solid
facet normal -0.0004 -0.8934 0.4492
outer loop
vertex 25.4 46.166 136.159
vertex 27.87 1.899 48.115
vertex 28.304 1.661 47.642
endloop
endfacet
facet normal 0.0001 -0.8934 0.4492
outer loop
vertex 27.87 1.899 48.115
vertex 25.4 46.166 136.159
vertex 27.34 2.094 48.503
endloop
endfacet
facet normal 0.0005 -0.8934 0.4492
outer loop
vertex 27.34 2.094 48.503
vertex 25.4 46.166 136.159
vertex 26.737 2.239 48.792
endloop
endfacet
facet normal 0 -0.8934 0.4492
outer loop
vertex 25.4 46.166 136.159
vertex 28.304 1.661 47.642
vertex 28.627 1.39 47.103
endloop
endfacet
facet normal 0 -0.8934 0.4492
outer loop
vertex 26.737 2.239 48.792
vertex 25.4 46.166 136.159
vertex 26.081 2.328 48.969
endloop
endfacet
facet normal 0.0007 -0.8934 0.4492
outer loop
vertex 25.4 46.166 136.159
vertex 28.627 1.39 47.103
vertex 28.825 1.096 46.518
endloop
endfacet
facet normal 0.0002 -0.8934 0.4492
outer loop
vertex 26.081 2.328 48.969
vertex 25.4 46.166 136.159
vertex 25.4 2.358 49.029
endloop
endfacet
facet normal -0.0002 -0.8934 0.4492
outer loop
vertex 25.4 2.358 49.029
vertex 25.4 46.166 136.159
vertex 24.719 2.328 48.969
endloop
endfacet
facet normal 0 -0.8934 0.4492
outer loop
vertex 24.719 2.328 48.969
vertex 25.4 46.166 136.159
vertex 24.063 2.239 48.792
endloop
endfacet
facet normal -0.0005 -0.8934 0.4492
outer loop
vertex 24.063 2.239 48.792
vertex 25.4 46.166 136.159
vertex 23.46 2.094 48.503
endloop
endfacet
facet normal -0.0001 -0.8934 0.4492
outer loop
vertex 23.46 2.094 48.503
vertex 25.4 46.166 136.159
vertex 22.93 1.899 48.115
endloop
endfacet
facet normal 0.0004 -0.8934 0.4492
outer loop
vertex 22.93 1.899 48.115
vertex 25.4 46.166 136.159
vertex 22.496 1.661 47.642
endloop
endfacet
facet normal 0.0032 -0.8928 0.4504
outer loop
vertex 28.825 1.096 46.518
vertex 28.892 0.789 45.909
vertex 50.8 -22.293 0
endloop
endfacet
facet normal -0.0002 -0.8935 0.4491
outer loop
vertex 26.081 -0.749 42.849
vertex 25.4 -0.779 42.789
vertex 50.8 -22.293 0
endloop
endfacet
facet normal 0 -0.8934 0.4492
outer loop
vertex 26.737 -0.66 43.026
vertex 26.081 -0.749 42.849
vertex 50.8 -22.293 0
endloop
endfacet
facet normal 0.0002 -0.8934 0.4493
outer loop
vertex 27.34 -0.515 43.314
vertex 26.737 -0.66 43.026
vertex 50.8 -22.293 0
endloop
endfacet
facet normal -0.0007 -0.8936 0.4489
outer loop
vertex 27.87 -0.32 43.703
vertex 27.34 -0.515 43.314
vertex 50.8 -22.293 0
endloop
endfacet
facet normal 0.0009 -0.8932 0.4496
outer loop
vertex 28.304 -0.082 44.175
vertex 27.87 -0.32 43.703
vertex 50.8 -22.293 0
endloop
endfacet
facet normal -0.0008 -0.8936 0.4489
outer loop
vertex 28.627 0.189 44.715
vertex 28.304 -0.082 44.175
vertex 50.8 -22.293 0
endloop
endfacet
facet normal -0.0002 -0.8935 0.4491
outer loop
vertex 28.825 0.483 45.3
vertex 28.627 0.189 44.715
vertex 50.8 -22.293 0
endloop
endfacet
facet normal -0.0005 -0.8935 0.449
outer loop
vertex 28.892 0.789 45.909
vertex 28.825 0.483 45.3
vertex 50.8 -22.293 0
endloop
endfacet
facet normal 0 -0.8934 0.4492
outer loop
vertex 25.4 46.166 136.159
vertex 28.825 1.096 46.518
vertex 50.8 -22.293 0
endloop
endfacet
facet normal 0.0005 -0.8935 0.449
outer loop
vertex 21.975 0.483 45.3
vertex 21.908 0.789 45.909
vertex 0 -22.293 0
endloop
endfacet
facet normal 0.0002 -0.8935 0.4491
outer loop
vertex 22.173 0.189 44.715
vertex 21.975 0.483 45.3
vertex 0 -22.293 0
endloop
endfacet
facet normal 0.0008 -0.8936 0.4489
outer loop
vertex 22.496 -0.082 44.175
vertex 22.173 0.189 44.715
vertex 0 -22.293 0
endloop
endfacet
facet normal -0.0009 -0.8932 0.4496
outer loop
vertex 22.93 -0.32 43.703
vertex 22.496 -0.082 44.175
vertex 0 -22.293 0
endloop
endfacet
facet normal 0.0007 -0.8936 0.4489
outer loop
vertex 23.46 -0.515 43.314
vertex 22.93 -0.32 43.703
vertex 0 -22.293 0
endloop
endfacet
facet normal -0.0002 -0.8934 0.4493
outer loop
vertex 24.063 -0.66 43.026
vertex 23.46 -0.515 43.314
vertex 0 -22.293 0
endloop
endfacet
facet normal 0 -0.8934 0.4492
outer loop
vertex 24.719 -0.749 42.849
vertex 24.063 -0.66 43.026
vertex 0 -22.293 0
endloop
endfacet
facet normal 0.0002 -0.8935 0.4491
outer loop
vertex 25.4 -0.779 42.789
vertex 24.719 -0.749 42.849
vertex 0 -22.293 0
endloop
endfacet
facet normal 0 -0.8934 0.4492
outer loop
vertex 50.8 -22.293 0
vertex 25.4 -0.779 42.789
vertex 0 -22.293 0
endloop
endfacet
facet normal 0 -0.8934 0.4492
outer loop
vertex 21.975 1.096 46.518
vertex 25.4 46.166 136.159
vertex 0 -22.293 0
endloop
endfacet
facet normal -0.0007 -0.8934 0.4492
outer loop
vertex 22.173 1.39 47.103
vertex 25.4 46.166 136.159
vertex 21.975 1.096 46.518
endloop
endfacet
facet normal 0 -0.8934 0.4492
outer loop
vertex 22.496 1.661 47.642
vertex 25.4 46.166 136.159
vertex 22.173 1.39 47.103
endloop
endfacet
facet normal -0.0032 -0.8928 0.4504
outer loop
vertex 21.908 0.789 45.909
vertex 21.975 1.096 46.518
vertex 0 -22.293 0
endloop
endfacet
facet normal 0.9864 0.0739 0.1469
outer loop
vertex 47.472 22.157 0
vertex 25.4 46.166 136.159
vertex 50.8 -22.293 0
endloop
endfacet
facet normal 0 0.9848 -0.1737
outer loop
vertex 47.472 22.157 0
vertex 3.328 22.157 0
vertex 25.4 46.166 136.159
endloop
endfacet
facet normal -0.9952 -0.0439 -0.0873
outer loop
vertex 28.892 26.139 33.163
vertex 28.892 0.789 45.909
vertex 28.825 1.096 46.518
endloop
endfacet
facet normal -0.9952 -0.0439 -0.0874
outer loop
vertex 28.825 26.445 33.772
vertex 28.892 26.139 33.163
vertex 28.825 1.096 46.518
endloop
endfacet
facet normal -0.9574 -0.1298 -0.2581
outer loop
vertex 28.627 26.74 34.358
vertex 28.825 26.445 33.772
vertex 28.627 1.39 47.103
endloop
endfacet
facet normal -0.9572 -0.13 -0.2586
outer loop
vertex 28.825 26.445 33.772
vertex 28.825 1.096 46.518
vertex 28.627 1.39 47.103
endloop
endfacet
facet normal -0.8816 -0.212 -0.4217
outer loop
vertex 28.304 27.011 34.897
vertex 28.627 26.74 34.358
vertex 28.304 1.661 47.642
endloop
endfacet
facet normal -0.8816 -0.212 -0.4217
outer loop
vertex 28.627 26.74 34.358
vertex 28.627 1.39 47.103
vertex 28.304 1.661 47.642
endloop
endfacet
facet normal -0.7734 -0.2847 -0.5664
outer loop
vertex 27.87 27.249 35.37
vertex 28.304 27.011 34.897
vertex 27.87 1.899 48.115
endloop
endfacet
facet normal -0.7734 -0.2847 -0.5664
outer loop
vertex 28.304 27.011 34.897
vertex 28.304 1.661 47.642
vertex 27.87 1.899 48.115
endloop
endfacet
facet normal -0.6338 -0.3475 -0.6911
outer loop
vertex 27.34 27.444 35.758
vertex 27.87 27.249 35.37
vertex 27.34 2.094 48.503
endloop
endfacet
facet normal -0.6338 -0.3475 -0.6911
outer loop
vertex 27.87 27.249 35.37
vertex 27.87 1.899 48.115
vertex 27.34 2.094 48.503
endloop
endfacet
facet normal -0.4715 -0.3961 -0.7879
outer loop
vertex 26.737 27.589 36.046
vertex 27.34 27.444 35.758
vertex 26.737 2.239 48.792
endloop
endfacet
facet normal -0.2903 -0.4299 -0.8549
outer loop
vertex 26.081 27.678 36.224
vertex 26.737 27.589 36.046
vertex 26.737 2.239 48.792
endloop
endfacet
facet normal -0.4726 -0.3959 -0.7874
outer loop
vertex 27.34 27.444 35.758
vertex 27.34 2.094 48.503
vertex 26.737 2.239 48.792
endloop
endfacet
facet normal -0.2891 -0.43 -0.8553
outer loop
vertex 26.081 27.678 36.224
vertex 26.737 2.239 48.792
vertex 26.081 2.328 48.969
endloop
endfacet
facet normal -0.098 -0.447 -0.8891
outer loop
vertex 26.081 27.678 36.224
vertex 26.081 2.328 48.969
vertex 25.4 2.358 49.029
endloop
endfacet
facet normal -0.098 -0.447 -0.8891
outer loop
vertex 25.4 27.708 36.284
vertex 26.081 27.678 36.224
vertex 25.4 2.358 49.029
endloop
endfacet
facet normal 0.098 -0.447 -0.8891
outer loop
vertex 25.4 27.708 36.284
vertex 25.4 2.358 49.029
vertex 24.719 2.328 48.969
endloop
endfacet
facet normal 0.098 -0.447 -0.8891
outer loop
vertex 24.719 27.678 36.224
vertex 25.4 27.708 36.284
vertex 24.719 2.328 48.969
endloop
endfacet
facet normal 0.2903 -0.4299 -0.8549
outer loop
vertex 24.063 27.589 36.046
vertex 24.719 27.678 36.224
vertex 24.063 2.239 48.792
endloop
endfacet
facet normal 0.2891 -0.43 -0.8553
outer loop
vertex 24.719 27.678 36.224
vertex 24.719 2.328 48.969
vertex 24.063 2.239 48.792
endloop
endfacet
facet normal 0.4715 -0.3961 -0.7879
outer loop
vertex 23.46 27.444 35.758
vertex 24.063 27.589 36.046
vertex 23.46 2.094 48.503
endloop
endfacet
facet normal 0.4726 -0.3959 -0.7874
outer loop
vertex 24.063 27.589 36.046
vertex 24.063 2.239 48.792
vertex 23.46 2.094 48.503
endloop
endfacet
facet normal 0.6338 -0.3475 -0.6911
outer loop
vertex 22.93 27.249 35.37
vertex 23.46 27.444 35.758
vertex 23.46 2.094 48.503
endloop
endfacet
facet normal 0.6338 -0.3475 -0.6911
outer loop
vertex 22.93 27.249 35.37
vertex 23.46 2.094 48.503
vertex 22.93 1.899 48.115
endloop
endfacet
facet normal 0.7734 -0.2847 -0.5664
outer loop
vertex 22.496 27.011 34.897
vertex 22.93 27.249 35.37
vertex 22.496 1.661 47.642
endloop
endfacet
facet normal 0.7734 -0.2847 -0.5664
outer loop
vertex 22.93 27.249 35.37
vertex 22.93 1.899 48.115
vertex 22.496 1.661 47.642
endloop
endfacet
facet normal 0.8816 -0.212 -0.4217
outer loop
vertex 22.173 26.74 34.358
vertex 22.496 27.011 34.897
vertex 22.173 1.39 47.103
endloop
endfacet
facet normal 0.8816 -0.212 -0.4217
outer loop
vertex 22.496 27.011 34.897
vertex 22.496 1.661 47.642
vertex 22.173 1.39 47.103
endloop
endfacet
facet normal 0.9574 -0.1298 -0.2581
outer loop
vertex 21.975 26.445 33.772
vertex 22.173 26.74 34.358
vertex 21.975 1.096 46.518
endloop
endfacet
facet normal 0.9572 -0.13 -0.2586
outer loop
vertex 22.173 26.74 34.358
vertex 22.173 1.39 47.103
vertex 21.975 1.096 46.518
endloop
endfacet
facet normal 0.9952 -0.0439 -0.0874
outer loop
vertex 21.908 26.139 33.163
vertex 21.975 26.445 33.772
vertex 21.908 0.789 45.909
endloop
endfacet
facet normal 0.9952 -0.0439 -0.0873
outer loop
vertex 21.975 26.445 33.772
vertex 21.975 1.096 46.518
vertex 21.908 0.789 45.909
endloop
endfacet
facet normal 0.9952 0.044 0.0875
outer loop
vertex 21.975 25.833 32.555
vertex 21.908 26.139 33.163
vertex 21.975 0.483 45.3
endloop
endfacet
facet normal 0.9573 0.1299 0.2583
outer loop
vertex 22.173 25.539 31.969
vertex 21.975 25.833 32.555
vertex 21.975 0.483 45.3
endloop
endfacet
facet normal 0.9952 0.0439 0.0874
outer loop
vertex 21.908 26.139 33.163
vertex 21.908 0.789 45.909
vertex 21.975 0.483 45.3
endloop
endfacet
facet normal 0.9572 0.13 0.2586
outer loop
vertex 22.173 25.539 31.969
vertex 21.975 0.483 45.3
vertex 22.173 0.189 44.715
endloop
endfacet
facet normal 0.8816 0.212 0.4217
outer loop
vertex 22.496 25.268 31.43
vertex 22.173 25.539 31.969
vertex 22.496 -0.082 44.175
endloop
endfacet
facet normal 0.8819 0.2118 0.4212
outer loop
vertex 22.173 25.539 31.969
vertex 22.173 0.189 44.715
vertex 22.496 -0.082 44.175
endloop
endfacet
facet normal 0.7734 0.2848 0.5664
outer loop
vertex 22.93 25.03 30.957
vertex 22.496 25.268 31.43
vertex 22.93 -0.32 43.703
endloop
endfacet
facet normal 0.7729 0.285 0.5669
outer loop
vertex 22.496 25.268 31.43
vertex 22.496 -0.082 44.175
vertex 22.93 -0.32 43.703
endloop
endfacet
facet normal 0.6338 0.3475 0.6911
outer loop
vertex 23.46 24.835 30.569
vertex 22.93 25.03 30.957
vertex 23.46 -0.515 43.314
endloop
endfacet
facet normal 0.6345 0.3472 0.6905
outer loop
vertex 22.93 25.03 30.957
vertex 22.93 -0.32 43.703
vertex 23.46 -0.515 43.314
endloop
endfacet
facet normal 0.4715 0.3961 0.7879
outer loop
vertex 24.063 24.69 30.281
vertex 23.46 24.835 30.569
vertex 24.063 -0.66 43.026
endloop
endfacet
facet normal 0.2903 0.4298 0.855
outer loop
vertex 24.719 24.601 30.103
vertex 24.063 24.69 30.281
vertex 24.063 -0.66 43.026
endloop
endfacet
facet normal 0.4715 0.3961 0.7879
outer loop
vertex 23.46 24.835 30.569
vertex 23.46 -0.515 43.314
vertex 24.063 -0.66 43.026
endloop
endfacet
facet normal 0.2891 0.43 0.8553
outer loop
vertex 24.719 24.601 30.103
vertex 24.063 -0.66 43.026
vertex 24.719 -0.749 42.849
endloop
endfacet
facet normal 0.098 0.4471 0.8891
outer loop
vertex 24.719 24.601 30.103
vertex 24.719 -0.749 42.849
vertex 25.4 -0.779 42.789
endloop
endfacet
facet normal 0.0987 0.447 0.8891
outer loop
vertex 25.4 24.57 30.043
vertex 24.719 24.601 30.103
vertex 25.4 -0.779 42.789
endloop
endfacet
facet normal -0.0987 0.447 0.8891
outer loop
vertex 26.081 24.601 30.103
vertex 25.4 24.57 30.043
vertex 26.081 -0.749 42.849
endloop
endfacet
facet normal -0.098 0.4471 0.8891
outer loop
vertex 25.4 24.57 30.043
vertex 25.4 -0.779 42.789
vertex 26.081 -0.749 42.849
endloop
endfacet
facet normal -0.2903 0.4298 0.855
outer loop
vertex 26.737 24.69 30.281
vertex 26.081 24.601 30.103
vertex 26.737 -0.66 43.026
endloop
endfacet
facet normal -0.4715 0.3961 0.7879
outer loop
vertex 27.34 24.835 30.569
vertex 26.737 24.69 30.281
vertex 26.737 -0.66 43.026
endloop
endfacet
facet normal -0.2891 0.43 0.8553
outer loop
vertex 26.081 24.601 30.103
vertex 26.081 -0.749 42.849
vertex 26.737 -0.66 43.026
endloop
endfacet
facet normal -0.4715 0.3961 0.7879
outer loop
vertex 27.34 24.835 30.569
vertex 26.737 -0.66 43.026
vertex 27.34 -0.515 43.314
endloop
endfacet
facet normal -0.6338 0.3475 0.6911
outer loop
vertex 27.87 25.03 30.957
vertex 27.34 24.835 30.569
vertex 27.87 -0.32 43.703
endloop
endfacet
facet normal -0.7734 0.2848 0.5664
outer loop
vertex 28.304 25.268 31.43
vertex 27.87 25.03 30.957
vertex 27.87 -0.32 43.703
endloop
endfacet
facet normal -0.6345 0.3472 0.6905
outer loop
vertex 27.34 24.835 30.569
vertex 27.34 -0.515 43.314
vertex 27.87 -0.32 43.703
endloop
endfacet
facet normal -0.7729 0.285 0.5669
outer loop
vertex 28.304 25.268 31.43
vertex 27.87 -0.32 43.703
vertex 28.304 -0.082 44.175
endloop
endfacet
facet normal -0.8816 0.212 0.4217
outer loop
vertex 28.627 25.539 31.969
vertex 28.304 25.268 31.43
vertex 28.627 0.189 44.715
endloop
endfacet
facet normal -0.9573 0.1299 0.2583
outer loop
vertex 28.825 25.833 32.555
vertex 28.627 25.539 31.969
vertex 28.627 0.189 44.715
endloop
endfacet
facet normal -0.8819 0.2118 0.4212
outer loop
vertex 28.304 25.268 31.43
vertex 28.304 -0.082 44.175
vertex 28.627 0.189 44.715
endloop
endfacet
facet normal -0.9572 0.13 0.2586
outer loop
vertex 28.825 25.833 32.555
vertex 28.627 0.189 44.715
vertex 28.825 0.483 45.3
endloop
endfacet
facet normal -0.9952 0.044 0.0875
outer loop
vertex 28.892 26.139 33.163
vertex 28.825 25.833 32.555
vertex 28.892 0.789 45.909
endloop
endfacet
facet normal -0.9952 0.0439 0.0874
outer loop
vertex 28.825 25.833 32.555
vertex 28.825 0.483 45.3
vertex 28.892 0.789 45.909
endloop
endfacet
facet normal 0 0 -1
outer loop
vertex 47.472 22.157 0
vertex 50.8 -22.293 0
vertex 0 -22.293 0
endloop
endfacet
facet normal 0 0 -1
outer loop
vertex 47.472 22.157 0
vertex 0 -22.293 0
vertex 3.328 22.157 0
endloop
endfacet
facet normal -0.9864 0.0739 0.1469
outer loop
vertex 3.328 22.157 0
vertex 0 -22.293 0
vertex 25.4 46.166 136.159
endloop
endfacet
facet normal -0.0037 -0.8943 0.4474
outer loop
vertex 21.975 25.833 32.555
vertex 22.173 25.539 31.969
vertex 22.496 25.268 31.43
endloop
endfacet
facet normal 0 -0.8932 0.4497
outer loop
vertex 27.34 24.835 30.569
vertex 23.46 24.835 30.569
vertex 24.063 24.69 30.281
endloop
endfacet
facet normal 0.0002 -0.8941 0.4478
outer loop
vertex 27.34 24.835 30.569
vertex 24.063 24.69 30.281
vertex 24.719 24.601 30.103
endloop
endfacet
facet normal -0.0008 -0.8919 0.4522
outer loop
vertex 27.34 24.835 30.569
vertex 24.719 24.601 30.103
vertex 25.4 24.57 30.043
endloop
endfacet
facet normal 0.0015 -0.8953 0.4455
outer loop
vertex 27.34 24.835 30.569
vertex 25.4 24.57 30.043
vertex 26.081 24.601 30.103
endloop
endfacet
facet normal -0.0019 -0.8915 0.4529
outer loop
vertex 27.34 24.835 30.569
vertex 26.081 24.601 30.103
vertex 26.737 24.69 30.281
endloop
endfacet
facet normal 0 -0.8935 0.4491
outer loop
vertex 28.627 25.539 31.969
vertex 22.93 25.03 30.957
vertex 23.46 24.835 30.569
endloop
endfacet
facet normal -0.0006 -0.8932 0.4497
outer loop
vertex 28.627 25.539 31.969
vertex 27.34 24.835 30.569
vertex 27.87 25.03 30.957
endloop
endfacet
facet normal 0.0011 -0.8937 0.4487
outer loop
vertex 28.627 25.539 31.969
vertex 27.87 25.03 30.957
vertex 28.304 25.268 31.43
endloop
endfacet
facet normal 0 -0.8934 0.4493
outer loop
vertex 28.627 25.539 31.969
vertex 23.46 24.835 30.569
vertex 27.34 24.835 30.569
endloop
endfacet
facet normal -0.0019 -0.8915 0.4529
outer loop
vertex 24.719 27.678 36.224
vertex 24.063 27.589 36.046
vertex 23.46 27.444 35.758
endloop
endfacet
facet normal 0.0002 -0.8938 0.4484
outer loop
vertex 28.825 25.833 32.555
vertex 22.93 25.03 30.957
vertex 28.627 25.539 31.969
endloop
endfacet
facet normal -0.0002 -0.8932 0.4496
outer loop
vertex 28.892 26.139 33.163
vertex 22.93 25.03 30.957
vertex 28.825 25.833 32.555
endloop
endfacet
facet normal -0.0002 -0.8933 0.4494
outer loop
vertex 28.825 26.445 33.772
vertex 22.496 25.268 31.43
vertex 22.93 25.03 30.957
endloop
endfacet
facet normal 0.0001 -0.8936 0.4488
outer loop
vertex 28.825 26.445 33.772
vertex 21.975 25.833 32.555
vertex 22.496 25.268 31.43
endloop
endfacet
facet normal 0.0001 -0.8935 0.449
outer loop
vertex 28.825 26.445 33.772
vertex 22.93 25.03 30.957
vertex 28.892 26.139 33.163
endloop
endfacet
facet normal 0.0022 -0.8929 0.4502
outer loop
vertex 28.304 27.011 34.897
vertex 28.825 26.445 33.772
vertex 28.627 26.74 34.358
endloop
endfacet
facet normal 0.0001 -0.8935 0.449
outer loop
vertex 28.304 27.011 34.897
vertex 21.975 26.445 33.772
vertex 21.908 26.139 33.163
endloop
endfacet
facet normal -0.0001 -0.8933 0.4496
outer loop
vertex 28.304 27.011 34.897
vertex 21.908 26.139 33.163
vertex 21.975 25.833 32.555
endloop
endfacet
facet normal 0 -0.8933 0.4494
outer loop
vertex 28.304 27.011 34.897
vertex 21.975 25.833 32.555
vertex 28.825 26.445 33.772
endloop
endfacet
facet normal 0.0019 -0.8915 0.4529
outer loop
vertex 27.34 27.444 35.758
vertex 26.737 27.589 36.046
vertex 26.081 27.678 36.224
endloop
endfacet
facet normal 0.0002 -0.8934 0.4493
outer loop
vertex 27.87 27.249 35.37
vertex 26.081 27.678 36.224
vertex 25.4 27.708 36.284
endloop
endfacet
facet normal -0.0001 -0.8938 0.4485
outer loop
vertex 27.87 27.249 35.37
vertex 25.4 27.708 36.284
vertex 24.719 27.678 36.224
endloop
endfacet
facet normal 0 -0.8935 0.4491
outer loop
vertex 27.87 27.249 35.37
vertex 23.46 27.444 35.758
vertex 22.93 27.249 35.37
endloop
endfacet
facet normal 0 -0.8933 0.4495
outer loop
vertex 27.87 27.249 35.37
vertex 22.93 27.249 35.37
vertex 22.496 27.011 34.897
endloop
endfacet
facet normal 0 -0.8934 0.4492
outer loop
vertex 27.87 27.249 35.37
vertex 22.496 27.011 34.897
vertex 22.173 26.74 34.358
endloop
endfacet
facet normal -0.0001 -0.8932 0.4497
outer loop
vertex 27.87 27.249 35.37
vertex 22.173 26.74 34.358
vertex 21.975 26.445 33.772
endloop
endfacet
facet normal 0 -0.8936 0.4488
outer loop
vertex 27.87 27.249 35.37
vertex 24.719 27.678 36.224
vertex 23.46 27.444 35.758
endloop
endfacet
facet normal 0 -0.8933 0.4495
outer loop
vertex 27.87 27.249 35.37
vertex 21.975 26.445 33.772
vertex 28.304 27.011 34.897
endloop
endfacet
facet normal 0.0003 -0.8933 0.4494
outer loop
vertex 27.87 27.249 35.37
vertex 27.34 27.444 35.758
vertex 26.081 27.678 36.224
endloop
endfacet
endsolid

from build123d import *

# Parameters (mm, degrees)
F1_DEPTH = 50.8
F3_DEPTH = 61.1638386197
F4_R     = 3.4925
F5_DEPTH = 28.37362


with BuildPart() as f1:
    # F0 (on Right) → F1 (new body)
    with BuildSketch(Plane.YZ):
        Polygon((46.165614252, 136.1587293462), (-22.2928433907, 0), (22.1571566093, 0), align=None)
    extrude(amount=F1_DEPTH)

    # F2 (on face) → F3 (cut, through all)
    with BuildSketch(Plane(origin=(0, -17.7945295552, 8.9468082853), x_dir=(1, 0, 0), z_dir=(0, -0.8934299826, 0.449202478))):
        Polygon((0, 142.3859995079), (0, -10.0140004921), (25.4, 142.3859995079), align=None)
        Polygon((50.8, 142.3859995079), (25.4, 142.3859995079), (50.8, -10.0140004921), align=None)
    extrude(amount=-F3_DEPTH, mode=Mode.SUBTRACT)

    # F4 (on face) → F5 (cut)
    with BuildSketch(Plane(origin=(0, -17.7945295552, 8.9468082853), x_dir=(1, 0, 0), z_dir=(0, -0.8934299826, 0.449202478))):
        with Locations((25.4, 41.371035104)):
            Circle(F4_R)
    extrude(amount=-F5_DEPTH, mode=Mode.SUBTRACT)


solid = f1.part
